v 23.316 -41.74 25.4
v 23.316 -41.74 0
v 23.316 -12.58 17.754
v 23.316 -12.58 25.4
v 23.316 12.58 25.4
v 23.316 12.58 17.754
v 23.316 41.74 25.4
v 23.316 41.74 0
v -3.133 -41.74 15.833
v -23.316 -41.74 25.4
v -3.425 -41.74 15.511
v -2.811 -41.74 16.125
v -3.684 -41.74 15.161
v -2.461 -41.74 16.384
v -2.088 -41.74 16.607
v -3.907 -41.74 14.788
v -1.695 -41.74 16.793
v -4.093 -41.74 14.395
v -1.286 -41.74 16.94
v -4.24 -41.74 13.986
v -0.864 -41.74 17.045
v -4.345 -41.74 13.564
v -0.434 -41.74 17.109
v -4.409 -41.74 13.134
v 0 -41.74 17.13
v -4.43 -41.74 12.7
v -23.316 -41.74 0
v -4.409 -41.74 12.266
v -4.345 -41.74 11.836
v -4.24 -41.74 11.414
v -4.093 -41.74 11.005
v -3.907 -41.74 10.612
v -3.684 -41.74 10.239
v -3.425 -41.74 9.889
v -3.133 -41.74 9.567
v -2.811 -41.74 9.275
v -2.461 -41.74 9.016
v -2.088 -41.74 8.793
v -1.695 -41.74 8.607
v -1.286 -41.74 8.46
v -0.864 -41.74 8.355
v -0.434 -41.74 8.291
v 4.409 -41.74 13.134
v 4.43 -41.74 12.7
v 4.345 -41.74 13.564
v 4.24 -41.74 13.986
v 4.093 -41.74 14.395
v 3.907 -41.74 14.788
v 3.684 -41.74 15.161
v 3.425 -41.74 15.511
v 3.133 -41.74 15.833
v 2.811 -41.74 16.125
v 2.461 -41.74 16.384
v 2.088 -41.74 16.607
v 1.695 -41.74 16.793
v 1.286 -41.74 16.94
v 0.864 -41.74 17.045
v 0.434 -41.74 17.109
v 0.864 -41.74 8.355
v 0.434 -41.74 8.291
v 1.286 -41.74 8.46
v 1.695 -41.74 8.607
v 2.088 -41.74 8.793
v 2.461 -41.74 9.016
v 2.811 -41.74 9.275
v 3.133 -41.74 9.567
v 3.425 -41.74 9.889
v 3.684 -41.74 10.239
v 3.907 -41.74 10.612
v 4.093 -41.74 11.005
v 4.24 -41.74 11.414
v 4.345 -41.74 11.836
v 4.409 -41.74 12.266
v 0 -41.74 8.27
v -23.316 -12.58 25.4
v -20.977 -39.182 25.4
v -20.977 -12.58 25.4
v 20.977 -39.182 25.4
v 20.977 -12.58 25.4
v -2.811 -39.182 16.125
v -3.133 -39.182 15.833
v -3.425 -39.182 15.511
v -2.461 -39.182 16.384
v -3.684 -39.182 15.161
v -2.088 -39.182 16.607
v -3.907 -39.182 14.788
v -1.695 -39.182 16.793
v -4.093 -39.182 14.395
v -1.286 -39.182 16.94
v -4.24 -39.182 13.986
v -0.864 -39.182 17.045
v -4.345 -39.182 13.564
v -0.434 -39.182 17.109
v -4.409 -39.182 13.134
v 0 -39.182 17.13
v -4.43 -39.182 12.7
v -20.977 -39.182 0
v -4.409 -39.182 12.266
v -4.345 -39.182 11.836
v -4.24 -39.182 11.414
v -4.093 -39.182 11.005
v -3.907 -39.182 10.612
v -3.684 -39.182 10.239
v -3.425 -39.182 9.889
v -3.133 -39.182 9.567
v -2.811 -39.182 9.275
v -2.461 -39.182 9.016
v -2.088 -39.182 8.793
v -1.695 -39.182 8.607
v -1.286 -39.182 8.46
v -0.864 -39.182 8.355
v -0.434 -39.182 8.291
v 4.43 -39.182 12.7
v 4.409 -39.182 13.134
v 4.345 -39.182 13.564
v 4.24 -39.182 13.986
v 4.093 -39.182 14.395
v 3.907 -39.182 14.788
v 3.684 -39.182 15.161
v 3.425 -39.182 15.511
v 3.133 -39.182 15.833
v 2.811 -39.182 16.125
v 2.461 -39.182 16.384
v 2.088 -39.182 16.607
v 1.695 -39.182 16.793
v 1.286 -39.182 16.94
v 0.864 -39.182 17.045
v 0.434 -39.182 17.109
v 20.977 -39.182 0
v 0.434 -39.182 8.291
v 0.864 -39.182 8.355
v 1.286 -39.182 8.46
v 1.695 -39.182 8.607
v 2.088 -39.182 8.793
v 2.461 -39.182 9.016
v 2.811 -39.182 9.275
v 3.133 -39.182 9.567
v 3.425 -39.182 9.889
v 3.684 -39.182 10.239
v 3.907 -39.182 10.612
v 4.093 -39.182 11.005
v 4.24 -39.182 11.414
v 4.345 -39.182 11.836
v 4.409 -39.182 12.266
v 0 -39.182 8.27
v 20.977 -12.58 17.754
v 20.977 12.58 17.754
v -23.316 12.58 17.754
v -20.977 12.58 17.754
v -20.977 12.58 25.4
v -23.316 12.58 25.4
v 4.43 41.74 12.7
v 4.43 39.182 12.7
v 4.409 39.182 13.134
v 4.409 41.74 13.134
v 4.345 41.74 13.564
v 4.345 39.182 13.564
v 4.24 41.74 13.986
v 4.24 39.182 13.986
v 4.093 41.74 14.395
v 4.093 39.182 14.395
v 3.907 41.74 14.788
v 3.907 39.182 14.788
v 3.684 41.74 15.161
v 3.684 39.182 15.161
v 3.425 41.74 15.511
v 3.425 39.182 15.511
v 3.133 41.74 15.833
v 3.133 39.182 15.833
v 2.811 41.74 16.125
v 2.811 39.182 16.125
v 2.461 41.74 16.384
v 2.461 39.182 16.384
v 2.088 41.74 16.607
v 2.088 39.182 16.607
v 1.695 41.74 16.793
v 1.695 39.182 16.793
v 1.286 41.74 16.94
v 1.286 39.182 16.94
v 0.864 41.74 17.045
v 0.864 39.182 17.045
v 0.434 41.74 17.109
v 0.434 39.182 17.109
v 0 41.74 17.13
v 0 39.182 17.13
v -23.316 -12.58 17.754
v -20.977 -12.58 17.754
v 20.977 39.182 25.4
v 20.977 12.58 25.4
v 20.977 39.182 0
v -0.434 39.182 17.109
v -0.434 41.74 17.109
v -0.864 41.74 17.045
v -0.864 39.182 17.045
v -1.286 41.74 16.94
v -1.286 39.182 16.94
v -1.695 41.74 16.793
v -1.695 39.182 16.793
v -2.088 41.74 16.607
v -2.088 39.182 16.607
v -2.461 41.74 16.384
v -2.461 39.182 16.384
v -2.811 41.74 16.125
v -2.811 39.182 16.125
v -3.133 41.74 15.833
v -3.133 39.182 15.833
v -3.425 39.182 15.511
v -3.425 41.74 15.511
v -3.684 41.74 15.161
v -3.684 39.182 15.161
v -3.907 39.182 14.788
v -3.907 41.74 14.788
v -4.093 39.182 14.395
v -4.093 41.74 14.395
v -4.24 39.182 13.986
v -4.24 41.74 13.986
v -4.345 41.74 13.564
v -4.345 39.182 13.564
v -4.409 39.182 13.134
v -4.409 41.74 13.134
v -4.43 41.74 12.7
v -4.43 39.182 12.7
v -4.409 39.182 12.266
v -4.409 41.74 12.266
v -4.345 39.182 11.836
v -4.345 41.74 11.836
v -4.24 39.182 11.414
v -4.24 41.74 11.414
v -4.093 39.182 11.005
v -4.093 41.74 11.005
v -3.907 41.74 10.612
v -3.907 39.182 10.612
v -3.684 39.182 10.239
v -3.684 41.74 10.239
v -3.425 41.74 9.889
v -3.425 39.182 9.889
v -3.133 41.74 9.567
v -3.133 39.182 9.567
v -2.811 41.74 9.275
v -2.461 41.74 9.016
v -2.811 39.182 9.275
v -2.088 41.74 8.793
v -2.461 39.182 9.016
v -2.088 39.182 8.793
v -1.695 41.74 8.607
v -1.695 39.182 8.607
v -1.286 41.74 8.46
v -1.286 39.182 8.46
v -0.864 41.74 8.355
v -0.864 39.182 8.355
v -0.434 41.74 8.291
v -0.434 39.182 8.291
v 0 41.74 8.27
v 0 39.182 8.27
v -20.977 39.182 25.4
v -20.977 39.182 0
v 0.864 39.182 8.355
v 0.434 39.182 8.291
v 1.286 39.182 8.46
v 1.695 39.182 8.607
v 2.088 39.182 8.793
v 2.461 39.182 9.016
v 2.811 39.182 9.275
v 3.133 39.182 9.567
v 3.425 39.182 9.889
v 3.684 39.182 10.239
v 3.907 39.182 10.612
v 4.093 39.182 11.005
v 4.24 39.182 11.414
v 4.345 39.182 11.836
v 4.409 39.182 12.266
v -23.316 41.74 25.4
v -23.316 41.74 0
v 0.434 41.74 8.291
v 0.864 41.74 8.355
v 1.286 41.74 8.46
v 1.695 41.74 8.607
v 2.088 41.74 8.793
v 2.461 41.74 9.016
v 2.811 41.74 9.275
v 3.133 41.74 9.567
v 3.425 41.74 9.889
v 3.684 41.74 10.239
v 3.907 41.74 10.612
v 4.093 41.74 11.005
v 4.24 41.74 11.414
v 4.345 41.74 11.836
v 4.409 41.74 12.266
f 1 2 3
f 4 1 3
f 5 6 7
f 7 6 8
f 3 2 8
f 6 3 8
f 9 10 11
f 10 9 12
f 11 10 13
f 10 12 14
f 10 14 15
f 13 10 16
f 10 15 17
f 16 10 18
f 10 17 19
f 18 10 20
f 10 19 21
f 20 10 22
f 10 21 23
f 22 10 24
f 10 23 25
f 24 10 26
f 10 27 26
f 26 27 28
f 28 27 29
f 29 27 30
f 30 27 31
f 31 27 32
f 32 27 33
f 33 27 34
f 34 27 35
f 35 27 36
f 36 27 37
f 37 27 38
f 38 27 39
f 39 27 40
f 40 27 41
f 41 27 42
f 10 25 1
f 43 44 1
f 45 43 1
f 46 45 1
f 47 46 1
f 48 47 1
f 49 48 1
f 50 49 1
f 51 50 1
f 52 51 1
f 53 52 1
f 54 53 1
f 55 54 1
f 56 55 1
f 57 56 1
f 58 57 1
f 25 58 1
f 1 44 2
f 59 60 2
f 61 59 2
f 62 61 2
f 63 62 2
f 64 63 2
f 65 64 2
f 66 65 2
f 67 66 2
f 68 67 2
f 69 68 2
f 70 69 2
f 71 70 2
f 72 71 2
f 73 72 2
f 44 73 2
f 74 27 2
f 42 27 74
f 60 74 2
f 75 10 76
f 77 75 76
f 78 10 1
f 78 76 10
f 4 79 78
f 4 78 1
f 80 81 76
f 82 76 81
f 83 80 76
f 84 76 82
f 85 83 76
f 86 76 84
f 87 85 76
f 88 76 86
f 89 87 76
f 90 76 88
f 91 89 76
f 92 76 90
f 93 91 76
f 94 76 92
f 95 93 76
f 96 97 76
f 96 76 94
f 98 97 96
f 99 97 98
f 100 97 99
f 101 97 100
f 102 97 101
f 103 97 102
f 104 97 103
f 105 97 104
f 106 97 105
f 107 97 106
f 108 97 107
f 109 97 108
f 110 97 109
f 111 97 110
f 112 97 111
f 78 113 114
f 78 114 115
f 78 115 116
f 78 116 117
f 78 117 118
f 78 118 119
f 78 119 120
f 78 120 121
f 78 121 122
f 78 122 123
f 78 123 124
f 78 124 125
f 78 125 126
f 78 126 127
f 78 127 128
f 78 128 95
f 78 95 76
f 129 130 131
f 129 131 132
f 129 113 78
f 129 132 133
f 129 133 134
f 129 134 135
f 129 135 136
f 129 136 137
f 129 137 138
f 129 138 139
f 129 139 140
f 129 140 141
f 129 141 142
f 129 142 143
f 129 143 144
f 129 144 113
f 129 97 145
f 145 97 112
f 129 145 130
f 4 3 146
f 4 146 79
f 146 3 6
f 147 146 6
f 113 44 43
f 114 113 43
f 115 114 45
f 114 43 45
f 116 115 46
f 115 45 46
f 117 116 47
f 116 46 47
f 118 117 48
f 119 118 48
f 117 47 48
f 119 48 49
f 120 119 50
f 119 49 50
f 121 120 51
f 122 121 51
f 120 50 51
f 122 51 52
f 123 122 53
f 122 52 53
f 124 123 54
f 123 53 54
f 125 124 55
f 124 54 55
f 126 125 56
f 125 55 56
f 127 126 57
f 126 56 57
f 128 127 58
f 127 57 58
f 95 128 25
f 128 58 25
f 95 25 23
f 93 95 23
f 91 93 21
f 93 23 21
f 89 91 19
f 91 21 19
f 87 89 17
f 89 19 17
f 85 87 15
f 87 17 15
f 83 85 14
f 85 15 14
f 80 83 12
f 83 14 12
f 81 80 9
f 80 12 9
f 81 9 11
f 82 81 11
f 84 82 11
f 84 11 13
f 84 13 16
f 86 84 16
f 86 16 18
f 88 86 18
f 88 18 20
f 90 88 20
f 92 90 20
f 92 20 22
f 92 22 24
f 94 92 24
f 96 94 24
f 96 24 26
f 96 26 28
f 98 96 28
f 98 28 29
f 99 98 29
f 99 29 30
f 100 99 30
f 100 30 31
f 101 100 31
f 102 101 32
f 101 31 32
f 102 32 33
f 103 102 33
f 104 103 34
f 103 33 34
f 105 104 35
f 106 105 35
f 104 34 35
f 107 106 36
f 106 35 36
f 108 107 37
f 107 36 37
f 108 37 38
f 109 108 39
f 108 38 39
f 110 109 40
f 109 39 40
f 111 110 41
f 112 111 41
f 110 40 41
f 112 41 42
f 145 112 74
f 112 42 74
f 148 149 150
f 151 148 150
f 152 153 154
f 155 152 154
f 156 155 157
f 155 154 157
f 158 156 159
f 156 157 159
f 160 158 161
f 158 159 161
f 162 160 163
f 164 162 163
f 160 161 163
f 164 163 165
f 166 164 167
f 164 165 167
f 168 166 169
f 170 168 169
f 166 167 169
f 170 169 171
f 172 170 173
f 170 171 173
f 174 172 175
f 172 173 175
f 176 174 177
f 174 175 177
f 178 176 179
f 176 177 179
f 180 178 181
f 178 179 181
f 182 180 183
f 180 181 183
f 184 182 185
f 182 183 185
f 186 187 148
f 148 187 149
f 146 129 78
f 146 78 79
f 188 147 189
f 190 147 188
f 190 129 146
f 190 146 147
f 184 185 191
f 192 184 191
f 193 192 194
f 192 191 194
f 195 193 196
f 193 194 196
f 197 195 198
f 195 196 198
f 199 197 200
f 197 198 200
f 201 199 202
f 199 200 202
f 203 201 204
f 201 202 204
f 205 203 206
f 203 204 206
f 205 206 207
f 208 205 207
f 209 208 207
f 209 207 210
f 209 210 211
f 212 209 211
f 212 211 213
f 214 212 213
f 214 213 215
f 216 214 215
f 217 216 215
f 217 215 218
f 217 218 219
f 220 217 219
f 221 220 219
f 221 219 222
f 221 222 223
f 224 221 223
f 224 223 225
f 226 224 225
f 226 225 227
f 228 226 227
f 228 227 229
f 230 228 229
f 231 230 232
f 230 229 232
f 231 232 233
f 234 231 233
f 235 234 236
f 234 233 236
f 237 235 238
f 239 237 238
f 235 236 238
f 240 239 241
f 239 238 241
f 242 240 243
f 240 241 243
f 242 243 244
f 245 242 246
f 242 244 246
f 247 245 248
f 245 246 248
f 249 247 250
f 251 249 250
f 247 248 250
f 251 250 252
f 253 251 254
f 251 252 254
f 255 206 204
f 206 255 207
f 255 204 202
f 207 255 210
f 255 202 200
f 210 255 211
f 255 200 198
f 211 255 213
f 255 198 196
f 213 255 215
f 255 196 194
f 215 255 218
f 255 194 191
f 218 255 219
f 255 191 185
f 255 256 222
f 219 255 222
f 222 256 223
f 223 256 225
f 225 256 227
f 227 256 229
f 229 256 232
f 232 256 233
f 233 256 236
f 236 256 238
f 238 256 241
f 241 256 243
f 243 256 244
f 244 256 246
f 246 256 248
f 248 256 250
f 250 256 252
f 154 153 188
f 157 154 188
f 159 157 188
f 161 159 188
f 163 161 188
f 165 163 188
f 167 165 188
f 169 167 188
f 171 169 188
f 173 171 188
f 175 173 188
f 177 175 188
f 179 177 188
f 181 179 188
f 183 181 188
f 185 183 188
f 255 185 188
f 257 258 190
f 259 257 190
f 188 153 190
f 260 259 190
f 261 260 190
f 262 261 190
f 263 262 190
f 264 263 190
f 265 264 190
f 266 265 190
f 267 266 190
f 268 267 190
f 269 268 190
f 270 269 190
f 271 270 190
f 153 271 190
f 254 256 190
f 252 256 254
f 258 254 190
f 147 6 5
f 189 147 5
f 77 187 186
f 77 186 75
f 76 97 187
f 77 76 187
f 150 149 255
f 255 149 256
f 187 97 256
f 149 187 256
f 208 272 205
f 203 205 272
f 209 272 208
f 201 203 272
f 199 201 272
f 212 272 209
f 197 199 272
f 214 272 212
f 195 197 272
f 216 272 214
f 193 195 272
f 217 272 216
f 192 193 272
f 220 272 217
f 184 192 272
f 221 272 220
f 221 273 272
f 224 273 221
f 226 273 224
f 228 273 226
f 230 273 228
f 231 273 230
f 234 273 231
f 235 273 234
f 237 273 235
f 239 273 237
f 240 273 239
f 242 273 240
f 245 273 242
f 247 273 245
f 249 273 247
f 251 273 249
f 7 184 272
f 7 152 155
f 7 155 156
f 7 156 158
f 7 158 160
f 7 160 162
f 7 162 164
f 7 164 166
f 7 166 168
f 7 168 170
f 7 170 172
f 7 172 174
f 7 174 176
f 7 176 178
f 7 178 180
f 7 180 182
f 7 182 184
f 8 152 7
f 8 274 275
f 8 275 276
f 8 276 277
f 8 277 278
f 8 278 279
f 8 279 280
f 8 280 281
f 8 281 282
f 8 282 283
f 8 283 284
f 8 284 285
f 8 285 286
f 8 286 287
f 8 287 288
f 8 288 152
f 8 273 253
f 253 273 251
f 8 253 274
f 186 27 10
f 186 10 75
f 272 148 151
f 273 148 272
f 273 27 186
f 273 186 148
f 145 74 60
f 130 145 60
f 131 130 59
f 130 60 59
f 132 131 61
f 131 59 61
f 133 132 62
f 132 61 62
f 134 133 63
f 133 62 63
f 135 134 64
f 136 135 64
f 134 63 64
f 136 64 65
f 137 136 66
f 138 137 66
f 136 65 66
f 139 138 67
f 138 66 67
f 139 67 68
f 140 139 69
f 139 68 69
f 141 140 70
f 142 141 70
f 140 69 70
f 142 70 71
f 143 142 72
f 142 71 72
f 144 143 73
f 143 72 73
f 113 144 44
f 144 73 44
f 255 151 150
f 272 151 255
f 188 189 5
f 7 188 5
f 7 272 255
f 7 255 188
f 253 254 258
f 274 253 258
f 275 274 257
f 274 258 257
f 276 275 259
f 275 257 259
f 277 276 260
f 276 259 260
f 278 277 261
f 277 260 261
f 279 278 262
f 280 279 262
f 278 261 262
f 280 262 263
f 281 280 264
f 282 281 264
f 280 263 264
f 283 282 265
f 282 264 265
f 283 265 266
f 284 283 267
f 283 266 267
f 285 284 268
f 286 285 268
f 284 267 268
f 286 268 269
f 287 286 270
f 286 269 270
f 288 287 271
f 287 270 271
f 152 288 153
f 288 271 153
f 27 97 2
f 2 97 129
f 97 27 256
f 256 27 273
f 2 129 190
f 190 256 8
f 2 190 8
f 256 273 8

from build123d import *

# Parameters (mm, degrees)
F0_W     = 46.632492
F0_H     = 83.48006
F0_W_2   = 41.954536
F0_H_2   = 78.36432
F1_DEPTH = 25.4
F2_W     = 25.159884
F2_H     = 7.646168
F3_DEPTH = 76.2
F5_DEPTH = 127


with BuildPart() as f1:
    # F0 (on Top) → F1 (new body)
    with BuildSketch(Plane.XY):
        Rectangle(F0_W, F0_H)
        Rectangle(F0_W_2, F0_H_2, mode=Mode.SUBTRACT)
    extrude(amount=F1_DEPTH)

    # F2 (on face) → F3 (cut)
    with BuildSketch(Plane.YZ.offset(23.316246)):
        with Locations((0, 21.576916)):
            Rectangle(F2_W, F2_H)
    extrude(amount=-F3_DEPTH, mode=Mode.SUBTRACT)

    # F4 (on face) → F5 (cut)
    with BuildSketch(Plane.XZ.offset(41.74003)):
        with BuildLine():
            Line((0, 17.130356), (0, 8.269644))
            ThreePointArc((0, 8.269644), (3.132735, 9.567265), (4.430356, 12.7))
            ThreePointArc((4.430356, 12.7), (3.132735, 15.832735), (0, 17.130356))
        make_face()
        with BuildLine():
            ThreePointArc((0, 17.130356), (-4.430356, 12.7), (0, 8.269644))
            Line((0, 8.269644), (0, 17.130356))
        make_face()
    extrude(amount=-F5_DEPTH, mode=Mode.SUBTRACT)


solid = f1.part
